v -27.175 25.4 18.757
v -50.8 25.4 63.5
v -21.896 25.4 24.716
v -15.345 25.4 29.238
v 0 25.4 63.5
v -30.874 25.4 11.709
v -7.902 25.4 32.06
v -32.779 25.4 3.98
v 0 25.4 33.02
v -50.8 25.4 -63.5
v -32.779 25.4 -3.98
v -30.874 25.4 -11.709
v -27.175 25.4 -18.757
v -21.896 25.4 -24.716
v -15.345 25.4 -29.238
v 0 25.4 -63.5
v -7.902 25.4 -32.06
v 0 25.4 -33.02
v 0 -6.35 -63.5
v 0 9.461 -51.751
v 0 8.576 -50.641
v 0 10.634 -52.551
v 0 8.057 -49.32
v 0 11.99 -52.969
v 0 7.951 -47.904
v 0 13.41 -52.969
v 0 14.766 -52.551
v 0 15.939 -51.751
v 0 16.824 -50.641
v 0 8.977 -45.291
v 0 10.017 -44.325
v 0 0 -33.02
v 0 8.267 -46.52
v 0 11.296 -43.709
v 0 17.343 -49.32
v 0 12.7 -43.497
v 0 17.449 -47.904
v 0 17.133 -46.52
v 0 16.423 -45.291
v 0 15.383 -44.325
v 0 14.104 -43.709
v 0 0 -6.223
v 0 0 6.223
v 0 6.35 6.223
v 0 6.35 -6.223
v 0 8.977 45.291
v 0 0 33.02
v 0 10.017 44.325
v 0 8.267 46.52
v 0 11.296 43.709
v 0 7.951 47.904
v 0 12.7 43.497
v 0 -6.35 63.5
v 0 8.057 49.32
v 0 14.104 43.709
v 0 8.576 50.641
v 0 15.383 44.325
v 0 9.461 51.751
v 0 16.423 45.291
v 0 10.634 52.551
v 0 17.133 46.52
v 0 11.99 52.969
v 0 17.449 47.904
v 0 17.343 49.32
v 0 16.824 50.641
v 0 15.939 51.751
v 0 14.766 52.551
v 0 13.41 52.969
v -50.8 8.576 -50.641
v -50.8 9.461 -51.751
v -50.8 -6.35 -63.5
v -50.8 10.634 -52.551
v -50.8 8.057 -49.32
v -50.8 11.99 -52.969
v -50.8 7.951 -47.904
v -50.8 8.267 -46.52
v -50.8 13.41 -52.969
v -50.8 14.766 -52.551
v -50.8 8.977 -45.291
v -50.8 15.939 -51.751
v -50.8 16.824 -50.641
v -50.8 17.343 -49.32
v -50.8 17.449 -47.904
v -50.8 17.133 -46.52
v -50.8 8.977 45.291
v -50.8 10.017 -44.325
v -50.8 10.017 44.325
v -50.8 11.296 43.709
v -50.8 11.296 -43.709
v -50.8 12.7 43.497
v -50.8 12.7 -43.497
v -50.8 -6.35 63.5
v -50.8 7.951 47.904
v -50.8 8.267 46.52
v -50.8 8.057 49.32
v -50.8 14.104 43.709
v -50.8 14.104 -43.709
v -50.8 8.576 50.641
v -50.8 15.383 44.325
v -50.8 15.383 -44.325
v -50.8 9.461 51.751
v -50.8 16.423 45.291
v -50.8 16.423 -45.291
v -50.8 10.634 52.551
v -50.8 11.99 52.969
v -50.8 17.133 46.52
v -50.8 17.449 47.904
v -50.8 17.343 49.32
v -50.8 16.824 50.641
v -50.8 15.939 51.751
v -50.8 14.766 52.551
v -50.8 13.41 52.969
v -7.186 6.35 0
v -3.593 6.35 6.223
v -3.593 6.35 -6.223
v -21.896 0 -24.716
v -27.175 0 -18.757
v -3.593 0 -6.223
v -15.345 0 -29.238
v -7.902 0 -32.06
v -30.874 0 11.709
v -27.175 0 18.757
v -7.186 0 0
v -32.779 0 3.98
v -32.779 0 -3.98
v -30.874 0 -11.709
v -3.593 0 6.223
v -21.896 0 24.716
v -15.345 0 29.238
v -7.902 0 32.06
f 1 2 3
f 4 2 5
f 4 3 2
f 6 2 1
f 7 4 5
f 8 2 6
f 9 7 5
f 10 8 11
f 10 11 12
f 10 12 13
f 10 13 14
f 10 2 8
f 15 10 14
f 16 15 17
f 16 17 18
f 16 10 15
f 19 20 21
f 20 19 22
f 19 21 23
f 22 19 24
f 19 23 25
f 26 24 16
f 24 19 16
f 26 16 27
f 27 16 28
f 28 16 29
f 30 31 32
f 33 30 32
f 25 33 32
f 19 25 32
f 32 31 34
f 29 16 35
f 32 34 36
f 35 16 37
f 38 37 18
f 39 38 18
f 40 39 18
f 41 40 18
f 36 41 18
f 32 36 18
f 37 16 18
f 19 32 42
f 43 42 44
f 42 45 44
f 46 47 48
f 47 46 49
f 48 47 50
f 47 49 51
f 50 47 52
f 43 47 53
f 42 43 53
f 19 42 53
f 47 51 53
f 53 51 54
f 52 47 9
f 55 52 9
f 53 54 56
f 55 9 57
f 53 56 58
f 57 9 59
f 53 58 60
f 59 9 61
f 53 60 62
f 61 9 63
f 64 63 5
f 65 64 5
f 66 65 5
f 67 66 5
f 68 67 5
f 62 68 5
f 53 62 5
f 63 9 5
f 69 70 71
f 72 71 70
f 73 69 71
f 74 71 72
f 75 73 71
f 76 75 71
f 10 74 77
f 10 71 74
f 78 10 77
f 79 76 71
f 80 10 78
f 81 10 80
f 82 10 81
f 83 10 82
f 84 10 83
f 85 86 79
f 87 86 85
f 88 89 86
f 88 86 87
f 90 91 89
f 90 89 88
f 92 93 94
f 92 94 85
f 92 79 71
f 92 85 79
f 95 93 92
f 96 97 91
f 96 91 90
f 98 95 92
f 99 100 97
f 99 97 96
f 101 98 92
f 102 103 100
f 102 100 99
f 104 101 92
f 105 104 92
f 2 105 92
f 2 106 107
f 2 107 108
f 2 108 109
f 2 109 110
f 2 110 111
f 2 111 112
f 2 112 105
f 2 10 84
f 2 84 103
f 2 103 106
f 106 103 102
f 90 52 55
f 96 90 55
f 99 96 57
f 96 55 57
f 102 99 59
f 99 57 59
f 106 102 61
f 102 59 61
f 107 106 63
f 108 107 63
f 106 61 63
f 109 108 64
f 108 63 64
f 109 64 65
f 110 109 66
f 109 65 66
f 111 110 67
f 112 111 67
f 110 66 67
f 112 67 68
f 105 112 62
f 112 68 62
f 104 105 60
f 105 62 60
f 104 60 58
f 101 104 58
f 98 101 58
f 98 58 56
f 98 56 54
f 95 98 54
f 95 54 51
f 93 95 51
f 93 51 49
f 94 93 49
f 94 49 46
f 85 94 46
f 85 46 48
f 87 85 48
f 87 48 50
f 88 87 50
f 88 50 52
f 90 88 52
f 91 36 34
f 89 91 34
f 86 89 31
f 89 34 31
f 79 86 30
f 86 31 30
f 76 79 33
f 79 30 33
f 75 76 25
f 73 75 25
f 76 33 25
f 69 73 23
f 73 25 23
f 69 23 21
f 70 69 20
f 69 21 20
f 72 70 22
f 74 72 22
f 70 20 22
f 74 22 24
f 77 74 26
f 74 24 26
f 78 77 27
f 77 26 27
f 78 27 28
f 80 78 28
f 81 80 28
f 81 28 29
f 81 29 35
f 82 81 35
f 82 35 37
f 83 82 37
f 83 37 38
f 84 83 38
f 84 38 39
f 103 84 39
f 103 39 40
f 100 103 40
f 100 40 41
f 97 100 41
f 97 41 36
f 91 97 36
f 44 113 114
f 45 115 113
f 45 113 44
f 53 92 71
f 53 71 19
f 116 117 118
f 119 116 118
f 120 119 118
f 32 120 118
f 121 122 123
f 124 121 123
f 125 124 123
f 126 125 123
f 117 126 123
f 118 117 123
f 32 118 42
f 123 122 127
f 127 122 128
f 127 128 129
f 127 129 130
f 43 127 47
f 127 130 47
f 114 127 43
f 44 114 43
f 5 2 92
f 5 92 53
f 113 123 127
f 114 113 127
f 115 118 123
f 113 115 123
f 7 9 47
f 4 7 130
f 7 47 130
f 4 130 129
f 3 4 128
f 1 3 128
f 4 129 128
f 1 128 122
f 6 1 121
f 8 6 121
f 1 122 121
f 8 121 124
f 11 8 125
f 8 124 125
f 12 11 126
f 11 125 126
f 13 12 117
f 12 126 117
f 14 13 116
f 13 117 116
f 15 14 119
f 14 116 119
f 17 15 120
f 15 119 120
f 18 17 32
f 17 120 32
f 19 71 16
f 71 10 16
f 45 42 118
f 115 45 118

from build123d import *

# Parameters (mm, degrees)
BOSS_EXTRUDE1_DEPTH = 25.4
SKETCH2_W           = 50.8
SKETCH2_H           = 127
BOSS_EXTRUDE2_DEPTH = 6.35
SKETCH3_R           = 4.7625
CUT_EXTRUDE1_DEPTH  = 86.194189943
BOSS_EXTRUDE3_DEPTH = 6.35


with BuildPart() as part:
    # Sketch1 → Boss-Extrude1 (new body)
    with BuildSketch(Plane(origin=(0, 0, 0), x_dir=(1, 0, 0), z_dir=(0, 1, 0))):
        with BuildLine():
            Line((0, 33.02), (0, 63.5))
            Line((0, 63.5), (-50.8, 63.5))
            Line((-50.8, 63.5), (-50.8, -63.5))
            Line((-50.8, -63.5), (0, -63.5))
            Line((0, -63.5), (0, -33.02))
            ThreePointArc((0, -33.02), (-33.02, 0), (0, 33.02))
        make_face()
    extrude(amount=BOSS_EXTRUDE1_DEPTH)

    # Sketch2 → Boss-Extrude2 (add)
    with BuildSketch(Plane.XZ):
        with Locations((-25.4, 0)):
            Rectangle(SKETCH2_W, SKETCH2_H)
    extrude(amount=BOSS_EXTRUDE2_DEPTH)

    # Sketch3 → Cut-Extrude1 (cut, through all)
    with BuildSketch(Plane(origin=(0, 0, 0), x_dir=(0, 0, -1), z_dir=(1, 0, 0))):
        with Locations((-48.26, 12.7)):
            Circle(SKETCH3_R)
        with Locations(Location((48.26, 12.7, 0), (0, 0, 180))):
            Circle(SKETCH3_R)
    extrude(amount=-CUT_EXTRUDE1_DEPTH, mode=Mode.SUBTRACT)

    # Sketch4 → Boss-Extrude3 (add)
    with BuildSketch(Plane(origin=(0, 0, 0), x_dir=(1, 0, 0), z_dir=(0, 1, 0))):
        Polygon((-3.592850725, 6.223), (-7.18570145, 0), (-3.592850725, -6.223), (0, -6.223), (0, 6.223), align=None)
    extrude(amount=BOSS_EXTRUDE3_DEPTH)


solid = part.part
